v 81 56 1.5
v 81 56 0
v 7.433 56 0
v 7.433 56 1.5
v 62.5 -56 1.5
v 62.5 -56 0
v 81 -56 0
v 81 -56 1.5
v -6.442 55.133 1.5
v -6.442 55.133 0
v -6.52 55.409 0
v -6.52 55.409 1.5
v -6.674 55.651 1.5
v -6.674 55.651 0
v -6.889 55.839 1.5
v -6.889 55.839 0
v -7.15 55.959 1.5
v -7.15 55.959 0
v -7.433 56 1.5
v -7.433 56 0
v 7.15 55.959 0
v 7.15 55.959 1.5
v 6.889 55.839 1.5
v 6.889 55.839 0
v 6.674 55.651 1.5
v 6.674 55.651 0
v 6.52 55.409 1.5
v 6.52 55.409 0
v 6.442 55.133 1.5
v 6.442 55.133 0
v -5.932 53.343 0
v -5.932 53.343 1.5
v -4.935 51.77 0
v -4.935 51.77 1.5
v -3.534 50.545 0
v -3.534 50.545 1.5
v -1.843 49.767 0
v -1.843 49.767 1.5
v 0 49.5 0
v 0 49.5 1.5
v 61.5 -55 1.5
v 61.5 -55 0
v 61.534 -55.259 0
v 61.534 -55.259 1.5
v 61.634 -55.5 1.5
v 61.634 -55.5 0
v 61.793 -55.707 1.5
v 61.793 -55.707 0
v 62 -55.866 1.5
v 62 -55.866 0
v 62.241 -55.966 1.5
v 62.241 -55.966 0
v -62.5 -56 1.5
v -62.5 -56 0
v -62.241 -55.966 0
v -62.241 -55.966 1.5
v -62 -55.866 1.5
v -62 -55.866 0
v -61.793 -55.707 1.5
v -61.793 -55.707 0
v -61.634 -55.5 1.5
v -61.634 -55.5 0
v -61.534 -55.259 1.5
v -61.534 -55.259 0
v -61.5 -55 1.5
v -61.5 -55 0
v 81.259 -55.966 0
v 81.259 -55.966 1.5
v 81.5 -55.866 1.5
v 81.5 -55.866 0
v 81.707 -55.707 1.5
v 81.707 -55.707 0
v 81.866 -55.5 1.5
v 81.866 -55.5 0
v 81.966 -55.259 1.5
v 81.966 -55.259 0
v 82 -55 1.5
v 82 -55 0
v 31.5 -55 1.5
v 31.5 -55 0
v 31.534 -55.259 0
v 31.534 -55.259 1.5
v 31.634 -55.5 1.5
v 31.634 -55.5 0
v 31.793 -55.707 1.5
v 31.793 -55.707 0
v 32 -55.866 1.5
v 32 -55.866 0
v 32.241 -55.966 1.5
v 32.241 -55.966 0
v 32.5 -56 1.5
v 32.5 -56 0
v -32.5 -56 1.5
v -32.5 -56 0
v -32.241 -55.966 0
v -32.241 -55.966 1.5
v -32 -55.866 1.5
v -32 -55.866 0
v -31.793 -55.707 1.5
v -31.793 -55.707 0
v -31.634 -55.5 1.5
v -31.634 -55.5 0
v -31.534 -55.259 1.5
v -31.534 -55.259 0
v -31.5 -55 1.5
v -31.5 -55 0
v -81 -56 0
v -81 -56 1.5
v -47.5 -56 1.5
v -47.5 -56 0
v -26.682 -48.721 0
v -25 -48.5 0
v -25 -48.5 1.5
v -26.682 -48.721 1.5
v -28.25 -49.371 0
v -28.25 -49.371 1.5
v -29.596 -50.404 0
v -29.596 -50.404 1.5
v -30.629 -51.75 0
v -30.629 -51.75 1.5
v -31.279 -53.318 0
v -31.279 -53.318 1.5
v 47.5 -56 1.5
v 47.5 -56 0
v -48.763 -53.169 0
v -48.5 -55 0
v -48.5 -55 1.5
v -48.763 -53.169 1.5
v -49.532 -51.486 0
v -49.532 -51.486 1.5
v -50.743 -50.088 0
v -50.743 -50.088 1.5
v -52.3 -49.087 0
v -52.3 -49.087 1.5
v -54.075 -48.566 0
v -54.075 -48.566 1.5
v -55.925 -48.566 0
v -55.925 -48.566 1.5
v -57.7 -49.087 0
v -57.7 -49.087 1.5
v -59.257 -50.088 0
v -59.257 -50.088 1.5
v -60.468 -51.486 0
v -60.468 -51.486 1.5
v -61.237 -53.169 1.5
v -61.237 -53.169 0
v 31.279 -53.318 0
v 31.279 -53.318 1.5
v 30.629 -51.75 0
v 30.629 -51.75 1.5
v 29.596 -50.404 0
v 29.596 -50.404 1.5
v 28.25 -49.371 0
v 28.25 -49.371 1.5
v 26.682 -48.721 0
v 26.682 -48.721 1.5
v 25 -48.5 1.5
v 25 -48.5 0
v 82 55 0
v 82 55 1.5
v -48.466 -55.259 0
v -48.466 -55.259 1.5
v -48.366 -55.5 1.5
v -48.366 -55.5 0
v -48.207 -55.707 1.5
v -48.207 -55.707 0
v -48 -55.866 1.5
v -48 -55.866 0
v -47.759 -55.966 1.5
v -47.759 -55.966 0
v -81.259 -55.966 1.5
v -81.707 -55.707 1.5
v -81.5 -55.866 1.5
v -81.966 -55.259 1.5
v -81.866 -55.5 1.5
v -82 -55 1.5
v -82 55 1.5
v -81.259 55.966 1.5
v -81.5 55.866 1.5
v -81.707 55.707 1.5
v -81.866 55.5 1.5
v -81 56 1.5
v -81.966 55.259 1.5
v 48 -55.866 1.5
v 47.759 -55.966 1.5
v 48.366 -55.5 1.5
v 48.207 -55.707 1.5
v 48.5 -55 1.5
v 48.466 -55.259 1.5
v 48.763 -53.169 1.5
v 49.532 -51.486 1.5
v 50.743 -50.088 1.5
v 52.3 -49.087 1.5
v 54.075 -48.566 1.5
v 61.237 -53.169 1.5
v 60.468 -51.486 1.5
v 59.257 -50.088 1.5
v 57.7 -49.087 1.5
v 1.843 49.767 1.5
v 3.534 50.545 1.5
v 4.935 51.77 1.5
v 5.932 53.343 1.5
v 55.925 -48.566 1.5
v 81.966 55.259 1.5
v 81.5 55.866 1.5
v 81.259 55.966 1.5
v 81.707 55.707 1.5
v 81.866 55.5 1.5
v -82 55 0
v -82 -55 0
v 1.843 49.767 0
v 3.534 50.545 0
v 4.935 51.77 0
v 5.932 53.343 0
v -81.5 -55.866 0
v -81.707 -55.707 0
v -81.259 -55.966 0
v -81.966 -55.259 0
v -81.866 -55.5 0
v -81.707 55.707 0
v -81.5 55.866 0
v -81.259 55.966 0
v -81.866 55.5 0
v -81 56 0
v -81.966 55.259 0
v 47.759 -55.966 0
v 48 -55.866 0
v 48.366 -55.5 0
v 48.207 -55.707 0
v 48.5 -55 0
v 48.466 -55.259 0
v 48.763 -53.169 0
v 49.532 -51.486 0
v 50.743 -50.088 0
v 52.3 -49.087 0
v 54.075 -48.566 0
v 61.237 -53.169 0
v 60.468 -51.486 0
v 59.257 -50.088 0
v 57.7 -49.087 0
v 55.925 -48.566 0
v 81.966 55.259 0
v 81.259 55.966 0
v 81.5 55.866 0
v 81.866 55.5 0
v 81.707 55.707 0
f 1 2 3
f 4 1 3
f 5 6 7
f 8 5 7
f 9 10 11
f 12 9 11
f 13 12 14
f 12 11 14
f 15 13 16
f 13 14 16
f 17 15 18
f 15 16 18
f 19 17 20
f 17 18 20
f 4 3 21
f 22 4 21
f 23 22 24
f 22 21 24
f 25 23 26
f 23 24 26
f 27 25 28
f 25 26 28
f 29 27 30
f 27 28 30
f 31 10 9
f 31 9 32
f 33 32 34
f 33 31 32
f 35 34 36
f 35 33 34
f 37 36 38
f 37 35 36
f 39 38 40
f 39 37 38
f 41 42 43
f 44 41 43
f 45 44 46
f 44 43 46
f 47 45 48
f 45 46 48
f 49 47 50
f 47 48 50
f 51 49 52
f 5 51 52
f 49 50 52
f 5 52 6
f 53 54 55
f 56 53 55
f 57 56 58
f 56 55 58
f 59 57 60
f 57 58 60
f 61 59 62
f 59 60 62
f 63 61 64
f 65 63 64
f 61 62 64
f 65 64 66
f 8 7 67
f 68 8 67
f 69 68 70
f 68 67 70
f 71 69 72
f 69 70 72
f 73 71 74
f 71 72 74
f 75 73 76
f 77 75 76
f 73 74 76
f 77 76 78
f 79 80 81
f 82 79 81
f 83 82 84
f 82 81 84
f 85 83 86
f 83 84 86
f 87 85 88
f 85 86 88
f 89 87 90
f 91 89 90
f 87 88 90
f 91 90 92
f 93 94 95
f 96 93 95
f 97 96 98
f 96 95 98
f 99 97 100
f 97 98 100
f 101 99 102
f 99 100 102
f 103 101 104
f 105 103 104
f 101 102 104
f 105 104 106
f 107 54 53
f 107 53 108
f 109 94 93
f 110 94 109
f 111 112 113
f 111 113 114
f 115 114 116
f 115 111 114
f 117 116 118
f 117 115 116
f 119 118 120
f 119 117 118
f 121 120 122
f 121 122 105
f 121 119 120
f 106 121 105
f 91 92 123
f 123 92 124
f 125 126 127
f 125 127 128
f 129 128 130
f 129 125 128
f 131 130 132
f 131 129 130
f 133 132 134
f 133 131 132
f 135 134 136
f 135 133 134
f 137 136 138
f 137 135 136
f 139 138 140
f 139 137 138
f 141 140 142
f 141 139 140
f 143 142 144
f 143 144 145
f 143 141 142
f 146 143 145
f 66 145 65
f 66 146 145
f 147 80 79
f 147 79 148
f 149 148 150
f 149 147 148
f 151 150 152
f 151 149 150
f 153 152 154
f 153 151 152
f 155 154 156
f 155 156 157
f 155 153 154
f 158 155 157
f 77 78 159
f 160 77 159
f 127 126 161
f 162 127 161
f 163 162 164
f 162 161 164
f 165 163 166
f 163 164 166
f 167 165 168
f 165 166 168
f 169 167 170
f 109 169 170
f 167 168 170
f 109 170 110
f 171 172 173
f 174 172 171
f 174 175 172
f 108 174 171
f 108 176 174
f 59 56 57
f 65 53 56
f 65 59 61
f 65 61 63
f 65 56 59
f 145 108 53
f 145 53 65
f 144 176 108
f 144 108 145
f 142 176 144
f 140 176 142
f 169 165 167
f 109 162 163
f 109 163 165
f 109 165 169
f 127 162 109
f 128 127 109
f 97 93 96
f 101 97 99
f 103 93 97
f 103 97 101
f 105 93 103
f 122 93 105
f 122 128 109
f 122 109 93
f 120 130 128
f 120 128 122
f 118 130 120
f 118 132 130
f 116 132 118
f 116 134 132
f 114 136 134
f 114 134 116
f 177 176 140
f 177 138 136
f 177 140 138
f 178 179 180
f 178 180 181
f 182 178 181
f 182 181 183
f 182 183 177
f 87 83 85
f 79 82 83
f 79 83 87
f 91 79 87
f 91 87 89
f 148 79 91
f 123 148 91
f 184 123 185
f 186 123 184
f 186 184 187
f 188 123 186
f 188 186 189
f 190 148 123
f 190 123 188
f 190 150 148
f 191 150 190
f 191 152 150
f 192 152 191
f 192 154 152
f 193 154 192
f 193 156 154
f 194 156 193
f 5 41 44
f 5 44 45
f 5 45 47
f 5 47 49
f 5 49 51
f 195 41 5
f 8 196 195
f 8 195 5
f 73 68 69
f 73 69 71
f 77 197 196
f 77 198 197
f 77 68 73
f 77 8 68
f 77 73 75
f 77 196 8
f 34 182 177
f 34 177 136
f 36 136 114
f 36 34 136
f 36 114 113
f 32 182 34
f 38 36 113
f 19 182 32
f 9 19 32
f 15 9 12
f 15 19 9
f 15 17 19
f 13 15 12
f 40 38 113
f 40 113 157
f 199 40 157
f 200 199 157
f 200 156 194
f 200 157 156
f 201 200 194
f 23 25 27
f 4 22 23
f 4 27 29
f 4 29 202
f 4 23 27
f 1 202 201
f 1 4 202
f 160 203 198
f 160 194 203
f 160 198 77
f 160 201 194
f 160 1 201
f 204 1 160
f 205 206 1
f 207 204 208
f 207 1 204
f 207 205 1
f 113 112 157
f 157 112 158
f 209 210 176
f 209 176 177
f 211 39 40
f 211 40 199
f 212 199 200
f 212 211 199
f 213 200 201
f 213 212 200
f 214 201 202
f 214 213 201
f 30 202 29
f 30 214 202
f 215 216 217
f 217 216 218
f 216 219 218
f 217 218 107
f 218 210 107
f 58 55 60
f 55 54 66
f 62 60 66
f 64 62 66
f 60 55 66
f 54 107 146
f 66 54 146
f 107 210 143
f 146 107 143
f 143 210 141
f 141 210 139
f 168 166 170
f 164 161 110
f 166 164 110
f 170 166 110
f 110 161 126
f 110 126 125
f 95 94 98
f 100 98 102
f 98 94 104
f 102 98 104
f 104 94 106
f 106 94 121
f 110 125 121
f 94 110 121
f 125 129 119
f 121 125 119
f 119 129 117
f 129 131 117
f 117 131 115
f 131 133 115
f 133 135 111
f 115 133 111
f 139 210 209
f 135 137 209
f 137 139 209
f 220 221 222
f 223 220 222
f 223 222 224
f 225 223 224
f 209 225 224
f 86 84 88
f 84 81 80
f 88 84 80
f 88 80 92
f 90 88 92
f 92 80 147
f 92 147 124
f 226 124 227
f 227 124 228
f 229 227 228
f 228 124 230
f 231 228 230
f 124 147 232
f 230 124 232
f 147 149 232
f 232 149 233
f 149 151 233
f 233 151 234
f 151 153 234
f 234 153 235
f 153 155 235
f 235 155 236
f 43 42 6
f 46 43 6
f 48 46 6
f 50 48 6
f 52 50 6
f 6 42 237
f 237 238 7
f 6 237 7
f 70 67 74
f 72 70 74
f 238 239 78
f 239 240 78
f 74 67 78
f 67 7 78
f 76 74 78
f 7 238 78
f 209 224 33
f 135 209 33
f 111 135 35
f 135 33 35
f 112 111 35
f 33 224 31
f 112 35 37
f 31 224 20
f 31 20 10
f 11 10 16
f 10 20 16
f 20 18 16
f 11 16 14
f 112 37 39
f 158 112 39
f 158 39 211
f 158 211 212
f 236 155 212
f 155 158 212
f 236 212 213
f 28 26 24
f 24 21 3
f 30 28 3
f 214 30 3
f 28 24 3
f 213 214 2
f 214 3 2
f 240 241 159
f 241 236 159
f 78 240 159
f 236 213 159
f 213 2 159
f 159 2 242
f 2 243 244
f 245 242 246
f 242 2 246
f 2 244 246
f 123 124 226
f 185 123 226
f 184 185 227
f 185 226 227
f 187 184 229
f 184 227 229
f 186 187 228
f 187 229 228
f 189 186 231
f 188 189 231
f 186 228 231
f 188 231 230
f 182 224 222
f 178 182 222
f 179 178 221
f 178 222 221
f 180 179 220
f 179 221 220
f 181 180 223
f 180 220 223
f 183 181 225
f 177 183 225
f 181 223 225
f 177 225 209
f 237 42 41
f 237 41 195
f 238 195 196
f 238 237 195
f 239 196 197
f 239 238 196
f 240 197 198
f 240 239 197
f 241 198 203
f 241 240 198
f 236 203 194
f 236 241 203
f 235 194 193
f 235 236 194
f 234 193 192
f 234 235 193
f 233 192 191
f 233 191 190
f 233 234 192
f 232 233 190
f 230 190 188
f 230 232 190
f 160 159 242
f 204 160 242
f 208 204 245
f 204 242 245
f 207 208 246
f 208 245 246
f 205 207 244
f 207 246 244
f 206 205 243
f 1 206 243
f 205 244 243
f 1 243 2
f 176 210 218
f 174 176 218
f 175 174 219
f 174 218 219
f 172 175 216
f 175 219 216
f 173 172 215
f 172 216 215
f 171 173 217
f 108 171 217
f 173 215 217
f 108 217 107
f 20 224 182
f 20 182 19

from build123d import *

# Parameters (mm, degrees)
EXTRUDE_DEPTH = 1.5


with BuildPart() as part:
    # Sketch → Extrude (new body)
    with BuildSketch(Plane.XY):
        with BuildLine():
            Line((82, -55), (82, 55))
            ThreePointArc((82, 55), (81.707107, 55.707107), (81, 56))
            Line((81, 56), (7.433034, 56))
            ThreePointArc((7.433034, 56), (6.774754, 55.752773), (6.441963, 55.133333))
            ThreePointArc((0, 49.5), (4.278824, 51.106978), (6.441963, 55.133333))
            ThreePointArc((-6.441963, 55.133333), (-4.278824, 51.106978), (0, 49.5))
            ThreePointArc((-6.441963, 55.133333), (-6.774754, 55.752773), (-7.433034, 56))
            Line((-81, 56), (-7.433034, 56))
            ThreePointArc((-81, 56), (-81.707107, 55.707107), (-82, 55))
            Line((-82, -55), (-82, 55))
            ThreePointArc((-82, -55), (-81.707107, -55.707107), (-81, -56))
            Line((-62.5, -56), (-81, -56))
            ThreePointArc((-62.5, -56), (-61.792893, -55.707107), (-61.5, -55))
            ThreePointArc((-48.5, -55), (-55, -48.5), (-61.5, -55))
            ThreePointArc((-48.5, -55), (-48.207107, -55.707107), (-47.5, -56))
            Line((-32.5, -56), (-47.5, -56))
            ThreePointArc((-32.5, -56), (-31.792893, -55.707107), (-31.5, -55))
            ThreePointArc((-25, -48.5), (-29.596194, -50.403806), (-31.5, -55))
            Line((-25, -48.5), (0, -48.5))
            Line((25, -48.5), (0, -48.5))
            ThreePointArc((31.5, -55), (29.596194, -50.403806), (25, -48.5))
            ThreePointArc((31.5, -55), (31.792893, -55.707107), (32.5, -56))
            Line((32.5, -56), (47.5, -56))
            ThreePointArc((47.5, -56), (48.207107, -55.707107), (48.5, -55))
            ThreePointArc((61.5, -55), (55, -48.5), (48.5, -55))
            ThreePointArc((61.5, -55), (61.792893, -55.707107), (62.5, -56))
            Line((62.5, -56), (81, -56))
            ThreePointArc((81, -56), (81.707107, -55.707107), (82, -55))
        make_face()
    extrude(amount=EXTRUDE_DEPTH)


solid = part.part
